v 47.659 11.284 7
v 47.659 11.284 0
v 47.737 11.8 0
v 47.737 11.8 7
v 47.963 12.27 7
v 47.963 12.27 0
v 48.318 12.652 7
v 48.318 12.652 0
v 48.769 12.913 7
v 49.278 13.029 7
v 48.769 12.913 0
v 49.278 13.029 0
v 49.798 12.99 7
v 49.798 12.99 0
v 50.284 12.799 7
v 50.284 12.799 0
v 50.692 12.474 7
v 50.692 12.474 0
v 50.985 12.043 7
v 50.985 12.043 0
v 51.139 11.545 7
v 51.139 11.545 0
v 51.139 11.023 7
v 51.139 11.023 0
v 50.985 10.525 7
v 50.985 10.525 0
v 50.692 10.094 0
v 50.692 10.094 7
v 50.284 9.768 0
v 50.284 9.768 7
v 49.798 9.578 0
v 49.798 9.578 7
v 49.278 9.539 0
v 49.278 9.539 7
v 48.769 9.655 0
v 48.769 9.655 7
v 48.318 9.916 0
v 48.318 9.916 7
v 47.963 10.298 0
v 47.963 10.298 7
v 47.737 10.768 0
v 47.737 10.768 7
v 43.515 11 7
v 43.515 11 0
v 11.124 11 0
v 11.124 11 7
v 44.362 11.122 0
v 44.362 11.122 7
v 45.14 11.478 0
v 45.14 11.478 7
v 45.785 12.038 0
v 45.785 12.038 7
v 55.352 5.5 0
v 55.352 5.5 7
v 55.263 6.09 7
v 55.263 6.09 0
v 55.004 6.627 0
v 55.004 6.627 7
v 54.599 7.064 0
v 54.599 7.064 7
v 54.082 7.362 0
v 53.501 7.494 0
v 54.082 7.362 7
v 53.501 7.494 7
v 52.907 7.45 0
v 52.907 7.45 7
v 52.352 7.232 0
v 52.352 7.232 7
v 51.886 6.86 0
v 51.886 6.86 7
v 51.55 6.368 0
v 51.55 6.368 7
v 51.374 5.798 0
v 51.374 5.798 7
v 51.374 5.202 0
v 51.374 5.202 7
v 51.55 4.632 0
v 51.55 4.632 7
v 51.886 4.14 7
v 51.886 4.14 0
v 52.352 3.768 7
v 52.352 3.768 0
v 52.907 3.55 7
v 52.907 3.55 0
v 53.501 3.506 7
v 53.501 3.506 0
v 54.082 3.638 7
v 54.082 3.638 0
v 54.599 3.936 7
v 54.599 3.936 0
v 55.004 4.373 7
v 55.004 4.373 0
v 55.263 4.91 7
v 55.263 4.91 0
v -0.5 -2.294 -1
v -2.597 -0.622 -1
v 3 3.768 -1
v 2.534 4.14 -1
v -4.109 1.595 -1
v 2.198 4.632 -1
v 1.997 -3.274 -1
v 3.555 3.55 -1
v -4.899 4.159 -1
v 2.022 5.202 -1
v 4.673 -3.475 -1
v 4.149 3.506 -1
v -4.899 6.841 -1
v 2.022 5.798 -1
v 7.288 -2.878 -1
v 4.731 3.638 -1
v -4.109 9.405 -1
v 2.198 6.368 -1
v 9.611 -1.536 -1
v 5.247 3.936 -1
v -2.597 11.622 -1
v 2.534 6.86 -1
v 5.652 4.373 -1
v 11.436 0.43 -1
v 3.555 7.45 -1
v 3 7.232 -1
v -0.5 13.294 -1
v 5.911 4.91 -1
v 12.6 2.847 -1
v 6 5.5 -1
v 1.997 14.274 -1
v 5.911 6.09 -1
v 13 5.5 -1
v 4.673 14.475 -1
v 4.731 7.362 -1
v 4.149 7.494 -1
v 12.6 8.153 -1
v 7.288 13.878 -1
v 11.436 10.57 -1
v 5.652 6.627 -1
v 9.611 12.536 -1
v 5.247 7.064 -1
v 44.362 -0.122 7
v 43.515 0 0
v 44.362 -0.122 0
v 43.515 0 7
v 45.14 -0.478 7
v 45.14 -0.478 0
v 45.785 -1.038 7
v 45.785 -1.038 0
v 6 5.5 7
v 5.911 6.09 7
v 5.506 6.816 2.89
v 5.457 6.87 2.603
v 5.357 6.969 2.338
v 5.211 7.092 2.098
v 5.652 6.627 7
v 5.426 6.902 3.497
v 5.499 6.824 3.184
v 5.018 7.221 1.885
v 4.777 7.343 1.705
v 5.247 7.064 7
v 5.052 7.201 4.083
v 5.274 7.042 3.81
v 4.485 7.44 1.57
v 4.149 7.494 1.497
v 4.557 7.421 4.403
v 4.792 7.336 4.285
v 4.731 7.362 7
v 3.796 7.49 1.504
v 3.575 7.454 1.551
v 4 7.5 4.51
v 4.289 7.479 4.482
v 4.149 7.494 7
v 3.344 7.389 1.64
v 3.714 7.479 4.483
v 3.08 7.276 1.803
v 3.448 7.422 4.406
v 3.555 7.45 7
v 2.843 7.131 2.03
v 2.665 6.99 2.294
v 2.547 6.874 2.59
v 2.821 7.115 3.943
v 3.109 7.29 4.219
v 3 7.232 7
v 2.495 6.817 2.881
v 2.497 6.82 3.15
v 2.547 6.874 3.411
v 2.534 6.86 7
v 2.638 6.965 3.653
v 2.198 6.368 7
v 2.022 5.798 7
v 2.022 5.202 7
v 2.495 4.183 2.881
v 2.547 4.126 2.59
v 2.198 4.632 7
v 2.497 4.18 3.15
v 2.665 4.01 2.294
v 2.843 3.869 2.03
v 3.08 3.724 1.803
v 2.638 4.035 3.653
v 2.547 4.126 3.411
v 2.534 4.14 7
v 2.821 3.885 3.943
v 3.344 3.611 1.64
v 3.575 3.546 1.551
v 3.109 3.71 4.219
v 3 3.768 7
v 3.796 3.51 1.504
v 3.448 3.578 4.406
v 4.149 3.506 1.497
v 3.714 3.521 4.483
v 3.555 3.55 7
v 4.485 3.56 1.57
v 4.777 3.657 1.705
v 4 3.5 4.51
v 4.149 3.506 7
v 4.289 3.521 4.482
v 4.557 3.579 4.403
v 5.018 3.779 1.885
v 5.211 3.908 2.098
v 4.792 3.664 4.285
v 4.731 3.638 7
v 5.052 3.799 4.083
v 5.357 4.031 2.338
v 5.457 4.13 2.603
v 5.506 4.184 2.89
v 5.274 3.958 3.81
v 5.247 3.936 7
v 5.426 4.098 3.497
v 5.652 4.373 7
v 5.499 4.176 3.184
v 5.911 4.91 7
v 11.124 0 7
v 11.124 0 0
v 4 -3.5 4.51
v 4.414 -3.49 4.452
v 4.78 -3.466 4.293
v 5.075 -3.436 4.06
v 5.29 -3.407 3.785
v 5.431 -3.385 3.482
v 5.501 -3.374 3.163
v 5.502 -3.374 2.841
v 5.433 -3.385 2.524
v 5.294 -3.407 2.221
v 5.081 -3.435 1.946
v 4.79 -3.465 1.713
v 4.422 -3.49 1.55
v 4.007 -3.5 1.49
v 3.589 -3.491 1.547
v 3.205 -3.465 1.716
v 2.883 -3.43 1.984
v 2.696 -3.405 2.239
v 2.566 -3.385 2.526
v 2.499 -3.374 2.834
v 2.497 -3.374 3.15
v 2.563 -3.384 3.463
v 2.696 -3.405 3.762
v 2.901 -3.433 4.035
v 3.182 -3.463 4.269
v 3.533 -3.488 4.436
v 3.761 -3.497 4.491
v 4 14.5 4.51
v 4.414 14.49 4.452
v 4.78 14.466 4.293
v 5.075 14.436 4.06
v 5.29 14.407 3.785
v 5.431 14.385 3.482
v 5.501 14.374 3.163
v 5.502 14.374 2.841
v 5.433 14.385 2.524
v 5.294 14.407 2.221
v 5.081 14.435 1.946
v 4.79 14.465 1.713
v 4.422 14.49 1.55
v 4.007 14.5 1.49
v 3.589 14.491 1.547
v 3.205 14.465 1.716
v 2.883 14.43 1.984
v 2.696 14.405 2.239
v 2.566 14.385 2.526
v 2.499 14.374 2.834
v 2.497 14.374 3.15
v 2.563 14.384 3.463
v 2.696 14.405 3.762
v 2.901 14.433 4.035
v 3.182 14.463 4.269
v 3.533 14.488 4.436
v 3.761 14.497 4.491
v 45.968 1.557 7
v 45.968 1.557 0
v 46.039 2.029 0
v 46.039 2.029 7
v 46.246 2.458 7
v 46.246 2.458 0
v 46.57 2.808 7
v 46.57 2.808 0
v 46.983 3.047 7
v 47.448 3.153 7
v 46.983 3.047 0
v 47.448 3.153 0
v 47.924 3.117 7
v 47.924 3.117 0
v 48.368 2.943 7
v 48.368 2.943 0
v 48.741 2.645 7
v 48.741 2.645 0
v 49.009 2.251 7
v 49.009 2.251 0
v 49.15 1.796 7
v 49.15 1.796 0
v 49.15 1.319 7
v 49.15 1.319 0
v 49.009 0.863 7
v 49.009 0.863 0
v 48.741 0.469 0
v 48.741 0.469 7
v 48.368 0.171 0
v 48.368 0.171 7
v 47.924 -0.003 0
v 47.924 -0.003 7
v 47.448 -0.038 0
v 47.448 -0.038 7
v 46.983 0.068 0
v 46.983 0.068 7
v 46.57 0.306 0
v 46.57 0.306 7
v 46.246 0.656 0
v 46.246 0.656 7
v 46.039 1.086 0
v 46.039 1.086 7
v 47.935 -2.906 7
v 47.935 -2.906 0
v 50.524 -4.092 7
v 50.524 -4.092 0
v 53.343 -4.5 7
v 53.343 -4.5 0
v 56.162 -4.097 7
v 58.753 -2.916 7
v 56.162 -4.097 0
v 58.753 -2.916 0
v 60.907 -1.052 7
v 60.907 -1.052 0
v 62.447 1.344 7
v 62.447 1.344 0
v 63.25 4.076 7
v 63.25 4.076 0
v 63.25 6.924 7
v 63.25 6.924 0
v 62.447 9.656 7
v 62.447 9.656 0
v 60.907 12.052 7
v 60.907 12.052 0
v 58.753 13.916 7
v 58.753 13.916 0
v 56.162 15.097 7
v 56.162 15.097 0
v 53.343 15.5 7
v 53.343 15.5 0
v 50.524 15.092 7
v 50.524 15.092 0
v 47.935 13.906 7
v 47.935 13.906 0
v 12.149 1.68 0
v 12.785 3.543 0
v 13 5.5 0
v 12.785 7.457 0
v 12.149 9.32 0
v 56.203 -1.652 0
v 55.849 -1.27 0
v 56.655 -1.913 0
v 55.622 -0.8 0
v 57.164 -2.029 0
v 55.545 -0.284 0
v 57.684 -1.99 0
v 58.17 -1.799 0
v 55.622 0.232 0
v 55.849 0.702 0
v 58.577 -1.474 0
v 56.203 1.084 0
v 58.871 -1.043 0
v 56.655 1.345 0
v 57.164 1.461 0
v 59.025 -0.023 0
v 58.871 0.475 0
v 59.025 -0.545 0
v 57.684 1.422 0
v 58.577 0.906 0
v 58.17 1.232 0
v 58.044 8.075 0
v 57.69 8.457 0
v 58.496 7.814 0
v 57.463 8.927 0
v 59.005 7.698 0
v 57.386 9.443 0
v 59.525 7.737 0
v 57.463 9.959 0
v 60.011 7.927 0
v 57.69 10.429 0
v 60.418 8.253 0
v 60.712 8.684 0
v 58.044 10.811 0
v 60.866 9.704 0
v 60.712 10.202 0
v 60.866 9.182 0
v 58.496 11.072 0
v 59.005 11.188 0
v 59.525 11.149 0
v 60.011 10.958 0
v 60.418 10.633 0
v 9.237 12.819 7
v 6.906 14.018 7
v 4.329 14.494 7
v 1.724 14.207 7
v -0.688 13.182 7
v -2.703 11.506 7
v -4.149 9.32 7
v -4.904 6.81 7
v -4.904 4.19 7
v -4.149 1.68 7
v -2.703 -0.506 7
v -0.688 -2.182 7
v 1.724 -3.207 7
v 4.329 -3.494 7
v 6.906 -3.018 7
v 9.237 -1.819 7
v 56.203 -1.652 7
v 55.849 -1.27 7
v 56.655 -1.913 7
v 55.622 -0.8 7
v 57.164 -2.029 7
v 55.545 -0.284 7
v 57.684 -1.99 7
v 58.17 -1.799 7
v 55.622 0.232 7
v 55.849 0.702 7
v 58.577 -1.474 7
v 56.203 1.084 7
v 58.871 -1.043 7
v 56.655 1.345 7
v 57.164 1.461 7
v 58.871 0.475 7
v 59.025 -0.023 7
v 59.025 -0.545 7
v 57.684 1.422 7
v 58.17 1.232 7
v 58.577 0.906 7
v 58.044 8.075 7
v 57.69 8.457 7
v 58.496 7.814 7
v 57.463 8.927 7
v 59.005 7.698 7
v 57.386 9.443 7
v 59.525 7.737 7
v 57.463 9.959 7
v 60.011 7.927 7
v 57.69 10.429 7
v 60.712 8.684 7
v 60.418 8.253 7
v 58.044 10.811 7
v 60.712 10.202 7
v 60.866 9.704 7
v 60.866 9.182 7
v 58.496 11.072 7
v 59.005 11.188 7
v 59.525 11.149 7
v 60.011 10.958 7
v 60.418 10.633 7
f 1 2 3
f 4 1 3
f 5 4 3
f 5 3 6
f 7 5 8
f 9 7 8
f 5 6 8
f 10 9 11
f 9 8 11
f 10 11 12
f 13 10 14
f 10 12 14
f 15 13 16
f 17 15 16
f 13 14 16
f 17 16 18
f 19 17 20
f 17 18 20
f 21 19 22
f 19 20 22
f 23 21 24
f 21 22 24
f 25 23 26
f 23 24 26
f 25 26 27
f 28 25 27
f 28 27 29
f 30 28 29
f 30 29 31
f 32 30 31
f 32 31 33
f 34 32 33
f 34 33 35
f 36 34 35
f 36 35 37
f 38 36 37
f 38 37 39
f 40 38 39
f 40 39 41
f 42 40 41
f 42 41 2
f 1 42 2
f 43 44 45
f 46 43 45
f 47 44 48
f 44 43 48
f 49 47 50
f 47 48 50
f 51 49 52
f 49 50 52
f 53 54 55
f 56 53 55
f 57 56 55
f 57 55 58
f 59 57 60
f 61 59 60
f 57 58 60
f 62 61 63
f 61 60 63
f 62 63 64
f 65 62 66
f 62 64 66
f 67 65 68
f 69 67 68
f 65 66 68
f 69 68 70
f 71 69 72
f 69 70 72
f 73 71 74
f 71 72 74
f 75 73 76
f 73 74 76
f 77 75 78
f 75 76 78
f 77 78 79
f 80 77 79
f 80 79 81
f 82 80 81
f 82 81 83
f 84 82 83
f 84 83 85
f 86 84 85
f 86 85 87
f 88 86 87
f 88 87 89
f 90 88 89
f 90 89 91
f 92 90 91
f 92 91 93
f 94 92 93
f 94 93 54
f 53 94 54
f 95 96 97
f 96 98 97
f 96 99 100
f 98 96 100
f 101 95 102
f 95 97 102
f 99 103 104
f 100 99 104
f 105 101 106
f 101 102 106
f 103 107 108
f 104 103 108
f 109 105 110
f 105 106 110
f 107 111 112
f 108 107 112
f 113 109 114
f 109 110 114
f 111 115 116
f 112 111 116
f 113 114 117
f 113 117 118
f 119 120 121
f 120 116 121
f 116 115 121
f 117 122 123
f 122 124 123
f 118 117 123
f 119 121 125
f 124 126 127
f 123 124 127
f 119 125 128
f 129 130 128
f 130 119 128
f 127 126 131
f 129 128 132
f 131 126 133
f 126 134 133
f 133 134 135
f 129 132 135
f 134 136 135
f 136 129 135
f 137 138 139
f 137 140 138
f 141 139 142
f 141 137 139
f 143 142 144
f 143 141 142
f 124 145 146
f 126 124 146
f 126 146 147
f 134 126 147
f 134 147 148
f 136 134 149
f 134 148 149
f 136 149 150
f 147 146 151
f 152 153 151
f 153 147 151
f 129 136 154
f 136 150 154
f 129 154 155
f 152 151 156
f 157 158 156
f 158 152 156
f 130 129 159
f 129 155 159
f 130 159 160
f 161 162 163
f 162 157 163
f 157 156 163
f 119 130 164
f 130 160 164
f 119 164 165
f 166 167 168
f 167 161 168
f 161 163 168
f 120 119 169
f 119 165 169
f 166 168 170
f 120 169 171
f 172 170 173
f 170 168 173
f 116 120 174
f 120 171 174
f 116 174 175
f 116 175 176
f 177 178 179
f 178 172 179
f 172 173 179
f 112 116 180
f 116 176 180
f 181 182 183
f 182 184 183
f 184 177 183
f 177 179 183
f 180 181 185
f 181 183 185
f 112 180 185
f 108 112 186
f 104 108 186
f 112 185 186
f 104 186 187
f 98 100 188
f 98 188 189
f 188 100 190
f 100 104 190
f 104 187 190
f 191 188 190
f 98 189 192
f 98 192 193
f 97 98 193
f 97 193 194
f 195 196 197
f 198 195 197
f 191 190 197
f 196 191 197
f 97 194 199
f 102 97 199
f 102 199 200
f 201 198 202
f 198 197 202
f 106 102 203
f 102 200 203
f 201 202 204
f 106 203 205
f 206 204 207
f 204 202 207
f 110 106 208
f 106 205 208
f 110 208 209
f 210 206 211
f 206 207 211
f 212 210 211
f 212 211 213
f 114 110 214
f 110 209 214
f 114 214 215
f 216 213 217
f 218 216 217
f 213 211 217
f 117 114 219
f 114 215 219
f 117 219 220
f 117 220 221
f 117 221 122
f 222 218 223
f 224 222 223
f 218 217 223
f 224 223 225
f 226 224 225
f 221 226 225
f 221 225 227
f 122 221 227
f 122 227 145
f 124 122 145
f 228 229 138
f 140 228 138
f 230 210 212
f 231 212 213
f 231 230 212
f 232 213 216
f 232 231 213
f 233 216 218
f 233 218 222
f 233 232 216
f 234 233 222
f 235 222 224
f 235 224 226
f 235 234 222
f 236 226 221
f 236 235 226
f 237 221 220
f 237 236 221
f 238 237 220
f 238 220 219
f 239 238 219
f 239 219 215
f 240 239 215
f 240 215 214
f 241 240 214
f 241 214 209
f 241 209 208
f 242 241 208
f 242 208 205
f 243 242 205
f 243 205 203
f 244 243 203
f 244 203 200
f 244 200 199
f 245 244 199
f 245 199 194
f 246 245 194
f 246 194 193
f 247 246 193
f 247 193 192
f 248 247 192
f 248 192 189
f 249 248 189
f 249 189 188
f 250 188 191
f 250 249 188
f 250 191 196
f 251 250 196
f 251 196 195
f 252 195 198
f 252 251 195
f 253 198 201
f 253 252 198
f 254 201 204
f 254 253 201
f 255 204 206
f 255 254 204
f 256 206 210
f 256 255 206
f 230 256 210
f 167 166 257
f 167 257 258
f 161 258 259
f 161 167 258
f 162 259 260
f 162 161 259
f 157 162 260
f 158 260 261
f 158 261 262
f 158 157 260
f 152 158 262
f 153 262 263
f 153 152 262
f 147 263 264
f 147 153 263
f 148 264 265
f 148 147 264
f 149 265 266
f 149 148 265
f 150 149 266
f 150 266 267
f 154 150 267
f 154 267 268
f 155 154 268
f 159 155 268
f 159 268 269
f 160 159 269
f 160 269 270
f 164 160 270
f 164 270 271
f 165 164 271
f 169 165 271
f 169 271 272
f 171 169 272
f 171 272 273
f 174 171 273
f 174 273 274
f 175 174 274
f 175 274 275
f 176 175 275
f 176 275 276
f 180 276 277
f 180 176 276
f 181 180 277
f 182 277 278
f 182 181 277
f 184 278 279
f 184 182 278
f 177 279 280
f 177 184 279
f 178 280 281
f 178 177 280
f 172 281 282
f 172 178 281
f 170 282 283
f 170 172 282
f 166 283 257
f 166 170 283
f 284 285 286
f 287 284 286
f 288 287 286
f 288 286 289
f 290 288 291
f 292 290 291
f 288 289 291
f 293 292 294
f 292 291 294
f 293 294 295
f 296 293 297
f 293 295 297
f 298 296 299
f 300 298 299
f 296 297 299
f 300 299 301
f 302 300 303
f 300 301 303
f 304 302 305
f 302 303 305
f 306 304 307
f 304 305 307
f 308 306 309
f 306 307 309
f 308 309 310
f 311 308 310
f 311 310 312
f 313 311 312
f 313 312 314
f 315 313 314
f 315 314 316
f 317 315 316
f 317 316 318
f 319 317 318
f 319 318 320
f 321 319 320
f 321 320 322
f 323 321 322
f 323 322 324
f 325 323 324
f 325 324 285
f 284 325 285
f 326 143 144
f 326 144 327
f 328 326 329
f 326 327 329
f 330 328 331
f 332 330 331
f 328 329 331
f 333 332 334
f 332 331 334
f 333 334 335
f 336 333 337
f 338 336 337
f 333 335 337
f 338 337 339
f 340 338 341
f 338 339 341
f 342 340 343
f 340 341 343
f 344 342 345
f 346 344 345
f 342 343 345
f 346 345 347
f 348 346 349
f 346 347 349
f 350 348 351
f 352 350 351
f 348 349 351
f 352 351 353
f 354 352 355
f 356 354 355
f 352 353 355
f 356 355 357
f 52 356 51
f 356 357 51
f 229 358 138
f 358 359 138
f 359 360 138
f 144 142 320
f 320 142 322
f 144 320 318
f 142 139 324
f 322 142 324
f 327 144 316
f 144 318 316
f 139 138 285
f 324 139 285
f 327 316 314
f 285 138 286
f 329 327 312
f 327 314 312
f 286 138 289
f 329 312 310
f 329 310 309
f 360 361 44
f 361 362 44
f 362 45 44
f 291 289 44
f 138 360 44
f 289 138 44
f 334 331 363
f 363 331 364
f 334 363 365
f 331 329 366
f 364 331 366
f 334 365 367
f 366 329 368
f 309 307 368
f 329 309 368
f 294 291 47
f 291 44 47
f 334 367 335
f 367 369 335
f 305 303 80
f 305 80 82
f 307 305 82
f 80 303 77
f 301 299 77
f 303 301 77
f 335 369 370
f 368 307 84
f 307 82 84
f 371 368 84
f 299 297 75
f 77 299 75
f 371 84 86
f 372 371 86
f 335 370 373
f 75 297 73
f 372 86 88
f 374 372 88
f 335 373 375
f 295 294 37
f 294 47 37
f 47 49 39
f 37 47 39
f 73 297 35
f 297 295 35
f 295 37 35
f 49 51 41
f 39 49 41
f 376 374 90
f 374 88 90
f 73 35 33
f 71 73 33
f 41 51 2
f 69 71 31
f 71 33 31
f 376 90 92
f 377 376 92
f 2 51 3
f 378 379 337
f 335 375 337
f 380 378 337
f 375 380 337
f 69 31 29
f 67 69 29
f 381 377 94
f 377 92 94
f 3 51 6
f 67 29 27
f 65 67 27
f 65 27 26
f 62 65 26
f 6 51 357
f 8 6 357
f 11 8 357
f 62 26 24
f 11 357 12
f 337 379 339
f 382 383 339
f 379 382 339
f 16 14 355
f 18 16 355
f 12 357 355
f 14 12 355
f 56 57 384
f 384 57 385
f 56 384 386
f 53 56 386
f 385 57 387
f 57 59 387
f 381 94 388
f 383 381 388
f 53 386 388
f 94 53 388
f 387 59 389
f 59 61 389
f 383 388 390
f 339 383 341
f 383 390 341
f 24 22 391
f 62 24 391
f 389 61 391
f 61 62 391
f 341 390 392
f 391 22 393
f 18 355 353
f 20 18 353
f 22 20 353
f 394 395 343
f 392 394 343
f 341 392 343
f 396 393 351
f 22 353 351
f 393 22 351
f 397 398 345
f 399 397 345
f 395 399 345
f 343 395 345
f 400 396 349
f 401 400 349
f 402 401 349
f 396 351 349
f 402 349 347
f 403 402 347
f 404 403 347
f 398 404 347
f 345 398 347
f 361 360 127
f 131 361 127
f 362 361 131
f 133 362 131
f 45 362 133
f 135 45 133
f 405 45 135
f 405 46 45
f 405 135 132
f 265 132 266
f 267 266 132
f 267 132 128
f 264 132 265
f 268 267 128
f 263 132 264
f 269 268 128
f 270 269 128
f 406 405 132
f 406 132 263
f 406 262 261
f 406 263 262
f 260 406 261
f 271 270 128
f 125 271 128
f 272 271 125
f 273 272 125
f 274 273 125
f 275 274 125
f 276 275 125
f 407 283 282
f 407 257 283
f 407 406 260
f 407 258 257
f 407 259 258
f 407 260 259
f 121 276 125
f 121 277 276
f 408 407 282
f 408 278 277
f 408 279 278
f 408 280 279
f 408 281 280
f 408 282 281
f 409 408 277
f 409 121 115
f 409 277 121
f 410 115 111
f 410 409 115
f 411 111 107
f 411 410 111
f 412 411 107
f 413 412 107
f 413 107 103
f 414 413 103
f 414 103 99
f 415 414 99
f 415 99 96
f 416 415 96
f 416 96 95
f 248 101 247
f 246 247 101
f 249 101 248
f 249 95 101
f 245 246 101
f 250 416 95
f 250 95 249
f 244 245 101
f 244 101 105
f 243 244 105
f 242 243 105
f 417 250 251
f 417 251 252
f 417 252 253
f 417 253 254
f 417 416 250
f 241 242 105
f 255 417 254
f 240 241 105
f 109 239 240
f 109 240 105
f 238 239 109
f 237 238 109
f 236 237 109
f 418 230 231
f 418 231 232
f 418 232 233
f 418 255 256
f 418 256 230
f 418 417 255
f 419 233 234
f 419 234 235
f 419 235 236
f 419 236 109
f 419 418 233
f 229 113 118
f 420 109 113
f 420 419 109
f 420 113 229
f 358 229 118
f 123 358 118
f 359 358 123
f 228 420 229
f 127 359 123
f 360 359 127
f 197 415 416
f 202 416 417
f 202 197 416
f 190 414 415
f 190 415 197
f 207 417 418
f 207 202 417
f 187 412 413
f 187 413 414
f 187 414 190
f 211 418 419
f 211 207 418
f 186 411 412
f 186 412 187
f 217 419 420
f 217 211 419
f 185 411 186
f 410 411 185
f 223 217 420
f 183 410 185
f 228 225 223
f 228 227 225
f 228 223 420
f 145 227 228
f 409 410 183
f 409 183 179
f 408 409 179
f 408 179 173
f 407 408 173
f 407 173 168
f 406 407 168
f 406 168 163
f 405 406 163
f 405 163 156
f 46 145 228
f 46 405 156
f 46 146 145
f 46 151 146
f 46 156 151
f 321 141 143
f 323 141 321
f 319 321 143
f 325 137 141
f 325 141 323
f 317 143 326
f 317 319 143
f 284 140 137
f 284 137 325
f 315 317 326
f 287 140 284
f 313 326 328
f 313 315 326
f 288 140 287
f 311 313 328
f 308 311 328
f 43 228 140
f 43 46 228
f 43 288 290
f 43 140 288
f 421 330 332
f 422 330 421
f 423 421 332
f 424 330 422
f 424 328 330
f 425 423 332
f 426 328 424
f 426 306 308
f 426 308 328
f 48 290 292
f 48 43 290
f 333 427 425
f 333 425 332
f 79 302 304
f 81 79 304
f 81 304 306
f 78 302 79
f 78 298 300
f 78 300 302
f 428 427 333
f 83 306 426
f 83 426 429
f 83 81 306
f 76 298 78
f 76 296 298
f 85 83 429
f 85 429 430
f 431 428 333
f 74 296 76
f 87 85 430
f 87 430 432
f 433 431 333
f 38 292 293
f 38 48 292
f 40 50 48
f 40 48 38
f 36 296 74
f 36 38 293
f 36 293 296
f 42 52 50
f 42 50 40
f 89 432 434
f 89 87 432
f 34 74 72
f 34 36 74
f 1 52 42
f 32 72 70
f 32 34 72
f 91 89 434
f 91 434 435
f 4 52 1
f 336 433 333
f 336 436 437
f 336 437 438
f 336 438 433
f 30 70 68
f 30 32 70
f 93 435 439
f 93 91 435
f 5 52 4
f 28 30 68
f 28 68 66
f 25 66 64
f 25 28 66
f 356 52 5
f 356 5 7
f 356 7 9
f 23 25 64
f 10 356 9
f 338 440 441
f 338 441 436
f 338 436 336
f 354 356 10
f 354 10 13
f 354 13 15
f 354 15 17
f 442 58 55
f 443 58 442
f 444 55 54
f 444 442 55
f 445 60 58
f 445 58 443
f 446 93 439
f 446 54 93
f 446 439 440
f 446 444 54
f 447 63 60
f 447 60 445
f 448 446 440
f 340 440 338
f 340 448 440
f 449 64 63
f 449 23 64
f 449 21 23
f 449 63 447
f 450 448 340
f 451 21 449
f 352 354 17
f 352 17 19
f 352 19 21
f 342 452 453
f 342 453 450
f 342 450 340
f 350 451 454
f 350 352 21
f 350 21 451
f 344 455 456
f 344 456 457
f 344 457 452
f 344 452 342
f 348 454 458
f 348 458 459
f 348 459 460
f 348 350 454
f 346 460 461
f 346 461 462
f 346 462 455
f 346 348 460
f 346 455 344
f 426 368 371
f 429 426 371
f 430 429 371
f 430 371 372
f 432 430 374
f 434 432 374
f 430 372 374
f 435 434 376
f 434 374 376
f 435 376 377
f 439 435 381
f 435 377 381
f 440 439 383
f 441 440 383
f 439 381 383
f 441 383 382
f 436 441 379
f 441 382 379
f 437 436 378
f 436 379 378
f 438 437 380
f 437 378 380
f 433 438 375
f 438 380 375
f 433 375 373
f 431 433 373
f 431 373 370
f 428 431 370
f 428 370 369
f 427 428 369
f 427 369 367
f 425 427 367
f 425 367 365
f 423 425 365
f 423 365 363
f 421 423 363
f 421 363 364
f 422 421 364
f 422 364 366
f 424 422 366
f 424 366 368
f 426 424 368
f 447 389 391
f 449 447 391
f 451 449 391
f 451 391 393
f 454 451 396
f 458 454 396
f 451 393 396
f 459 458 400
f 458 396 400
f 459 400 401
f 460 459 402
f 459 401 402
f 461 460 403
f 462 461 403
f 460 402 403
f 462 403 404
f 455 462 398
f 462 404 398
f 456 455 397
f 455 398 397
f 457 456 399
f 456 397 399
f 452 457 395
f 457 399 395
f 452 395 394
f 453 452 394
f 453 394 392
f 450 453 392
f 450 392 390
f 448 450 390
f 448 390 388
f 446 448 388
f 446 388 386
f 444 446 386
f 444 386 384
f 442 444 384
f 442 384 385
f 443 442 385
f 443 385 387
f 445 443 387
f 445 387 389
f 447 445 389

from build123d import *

# Parameters (mm, degrees)
BOSS_EXTRUDE1_DEPTH      = 7
SKETCH2_R                = 2
CUT_EXTRUDE1_DEPTH       = 66.594825405
FILLET11_R               = 3
SKETCH32_R               = 2
CUT_EXTRUDE14_DEPTH      = 66.594825405
SKETCH33_R               = 9
SKETCH33_R_2             = 2
BOSS_EXTRUDE2_DEPTH      = 8
SKETCH35_R               = 1.6
SKETCH35_R_2             = 1.75
CUT_EXTRUDE15_DEPTH      = 66.594825405
CUT_EXTRUDE16_DEPTH      = 65.51690569
CUT_EXTRUDE16_DEPTH_BACK = 65.51690569
SKETCH37_R               = 1.51


with BuildPart() as part:
    # Sketch1 → Boss-Extrude1 (new body)
    with BuildSketch(Plane.XY):
        with BuildLine():
            Line((0, 11), (0, 0))
            Line((0, 0), (45, 0))
            ThreePointArc((45, 0), (63.351646544, 5.5), (45, 11))
            Line((45, 11), (0, 11))
        make_face()
    extrude(amount=BOSS_EXTRUDE1_DEPTH)

    # Sketch2 → Cut-Extrude1 (cut, through all)
    with BuildSketch(Plane.XY.offset(7)):
        with Locations((53.351646544, 5.5)):
            Circle(SKETCH2_R)
        with Locations((-8.351646544, 5.5)):
            Circle(SKETCH2_R)
    extrude(amount=-CUT_EXTRUDE1_DEPTH, mode=Mode.SUBTRACT)

    # Fillet11
    fillet11_edges = [part.edges().sort_by_distance(p)[0] for p in [
        (45, 11, 3.5),
        (45, 0, 3.5),
    ]]
    fillet(fillet11_edges, radius=FILLET11_R)

    # Sketch32 → Cut-Extrude14 (cut, through all)
    with BuildSketch(Plane.XY.offset(7)):
        with Locations((4, 5.5)):
            Circle(SKETCH32_R)
    extrude(amount=-CUT_EXTRUDE14_DEPTH, mode=Mode.SUBTRACT)

    # Sketch33 → Boss-Extrude2 (add)
    with BuildSketch(Plane.XY.offset(7)):
        with Locations((4, 5.5)):
            Circle(SKETCH33_R)
        with Locations((4, 5.5)):
            Circle(SKETCH33_R_2, mode=Mode.SUBTRACT)
    extrude(amount=-BOSS_EXTRUDE2_DEPTH)

    # Sketch35 → Cut-Extrude15 (cut, through all)
    with BuildSketch(Plane(origin=(0, 0, 0), x_dir=(-1, 0, 0), z_dir=(0, 0, -1))):
        with Locations((-47.567725348, 1.557125972)):
            Circle(SKETCH35_R)
        with Locations((-57.294520572, -0.283921196)):
            Circle(SKETCH35_R_2)
        with Locations((-59.13556774, 9.442874028)):
            Circle(SKETCH35_R_2)
        with Locations((-49.408772516, 11.283921196)):
            Circle(SKETCH35_R_2)
    extrude(amount=-CUT_EXTRUDE15_DEPTH, mode=Mode.SUBTRACT)

    # Sketch37 → Cut-Extrude16 (cut, two sides: drawn at the far end of the back side and taken through both)
    with BuildSketch(Plane(origin=(0, 5.5, 0), x_dir=(1, 0, 0), z_dir=(0, 1, 0)).offset(-CUT_EXTRUDE16_DEPTH_BACK)):
        with Locations(Location((4, -3, 0), (0, 0, 270))):
            Circle(SKETCH37_R)
    extrude(amount=CUT_EXTRUDE16_DEPTH + CUT_EXTRUDE16_DEPTH_BACK, mode=Mode.SUBTRACT)


solid = part.part
